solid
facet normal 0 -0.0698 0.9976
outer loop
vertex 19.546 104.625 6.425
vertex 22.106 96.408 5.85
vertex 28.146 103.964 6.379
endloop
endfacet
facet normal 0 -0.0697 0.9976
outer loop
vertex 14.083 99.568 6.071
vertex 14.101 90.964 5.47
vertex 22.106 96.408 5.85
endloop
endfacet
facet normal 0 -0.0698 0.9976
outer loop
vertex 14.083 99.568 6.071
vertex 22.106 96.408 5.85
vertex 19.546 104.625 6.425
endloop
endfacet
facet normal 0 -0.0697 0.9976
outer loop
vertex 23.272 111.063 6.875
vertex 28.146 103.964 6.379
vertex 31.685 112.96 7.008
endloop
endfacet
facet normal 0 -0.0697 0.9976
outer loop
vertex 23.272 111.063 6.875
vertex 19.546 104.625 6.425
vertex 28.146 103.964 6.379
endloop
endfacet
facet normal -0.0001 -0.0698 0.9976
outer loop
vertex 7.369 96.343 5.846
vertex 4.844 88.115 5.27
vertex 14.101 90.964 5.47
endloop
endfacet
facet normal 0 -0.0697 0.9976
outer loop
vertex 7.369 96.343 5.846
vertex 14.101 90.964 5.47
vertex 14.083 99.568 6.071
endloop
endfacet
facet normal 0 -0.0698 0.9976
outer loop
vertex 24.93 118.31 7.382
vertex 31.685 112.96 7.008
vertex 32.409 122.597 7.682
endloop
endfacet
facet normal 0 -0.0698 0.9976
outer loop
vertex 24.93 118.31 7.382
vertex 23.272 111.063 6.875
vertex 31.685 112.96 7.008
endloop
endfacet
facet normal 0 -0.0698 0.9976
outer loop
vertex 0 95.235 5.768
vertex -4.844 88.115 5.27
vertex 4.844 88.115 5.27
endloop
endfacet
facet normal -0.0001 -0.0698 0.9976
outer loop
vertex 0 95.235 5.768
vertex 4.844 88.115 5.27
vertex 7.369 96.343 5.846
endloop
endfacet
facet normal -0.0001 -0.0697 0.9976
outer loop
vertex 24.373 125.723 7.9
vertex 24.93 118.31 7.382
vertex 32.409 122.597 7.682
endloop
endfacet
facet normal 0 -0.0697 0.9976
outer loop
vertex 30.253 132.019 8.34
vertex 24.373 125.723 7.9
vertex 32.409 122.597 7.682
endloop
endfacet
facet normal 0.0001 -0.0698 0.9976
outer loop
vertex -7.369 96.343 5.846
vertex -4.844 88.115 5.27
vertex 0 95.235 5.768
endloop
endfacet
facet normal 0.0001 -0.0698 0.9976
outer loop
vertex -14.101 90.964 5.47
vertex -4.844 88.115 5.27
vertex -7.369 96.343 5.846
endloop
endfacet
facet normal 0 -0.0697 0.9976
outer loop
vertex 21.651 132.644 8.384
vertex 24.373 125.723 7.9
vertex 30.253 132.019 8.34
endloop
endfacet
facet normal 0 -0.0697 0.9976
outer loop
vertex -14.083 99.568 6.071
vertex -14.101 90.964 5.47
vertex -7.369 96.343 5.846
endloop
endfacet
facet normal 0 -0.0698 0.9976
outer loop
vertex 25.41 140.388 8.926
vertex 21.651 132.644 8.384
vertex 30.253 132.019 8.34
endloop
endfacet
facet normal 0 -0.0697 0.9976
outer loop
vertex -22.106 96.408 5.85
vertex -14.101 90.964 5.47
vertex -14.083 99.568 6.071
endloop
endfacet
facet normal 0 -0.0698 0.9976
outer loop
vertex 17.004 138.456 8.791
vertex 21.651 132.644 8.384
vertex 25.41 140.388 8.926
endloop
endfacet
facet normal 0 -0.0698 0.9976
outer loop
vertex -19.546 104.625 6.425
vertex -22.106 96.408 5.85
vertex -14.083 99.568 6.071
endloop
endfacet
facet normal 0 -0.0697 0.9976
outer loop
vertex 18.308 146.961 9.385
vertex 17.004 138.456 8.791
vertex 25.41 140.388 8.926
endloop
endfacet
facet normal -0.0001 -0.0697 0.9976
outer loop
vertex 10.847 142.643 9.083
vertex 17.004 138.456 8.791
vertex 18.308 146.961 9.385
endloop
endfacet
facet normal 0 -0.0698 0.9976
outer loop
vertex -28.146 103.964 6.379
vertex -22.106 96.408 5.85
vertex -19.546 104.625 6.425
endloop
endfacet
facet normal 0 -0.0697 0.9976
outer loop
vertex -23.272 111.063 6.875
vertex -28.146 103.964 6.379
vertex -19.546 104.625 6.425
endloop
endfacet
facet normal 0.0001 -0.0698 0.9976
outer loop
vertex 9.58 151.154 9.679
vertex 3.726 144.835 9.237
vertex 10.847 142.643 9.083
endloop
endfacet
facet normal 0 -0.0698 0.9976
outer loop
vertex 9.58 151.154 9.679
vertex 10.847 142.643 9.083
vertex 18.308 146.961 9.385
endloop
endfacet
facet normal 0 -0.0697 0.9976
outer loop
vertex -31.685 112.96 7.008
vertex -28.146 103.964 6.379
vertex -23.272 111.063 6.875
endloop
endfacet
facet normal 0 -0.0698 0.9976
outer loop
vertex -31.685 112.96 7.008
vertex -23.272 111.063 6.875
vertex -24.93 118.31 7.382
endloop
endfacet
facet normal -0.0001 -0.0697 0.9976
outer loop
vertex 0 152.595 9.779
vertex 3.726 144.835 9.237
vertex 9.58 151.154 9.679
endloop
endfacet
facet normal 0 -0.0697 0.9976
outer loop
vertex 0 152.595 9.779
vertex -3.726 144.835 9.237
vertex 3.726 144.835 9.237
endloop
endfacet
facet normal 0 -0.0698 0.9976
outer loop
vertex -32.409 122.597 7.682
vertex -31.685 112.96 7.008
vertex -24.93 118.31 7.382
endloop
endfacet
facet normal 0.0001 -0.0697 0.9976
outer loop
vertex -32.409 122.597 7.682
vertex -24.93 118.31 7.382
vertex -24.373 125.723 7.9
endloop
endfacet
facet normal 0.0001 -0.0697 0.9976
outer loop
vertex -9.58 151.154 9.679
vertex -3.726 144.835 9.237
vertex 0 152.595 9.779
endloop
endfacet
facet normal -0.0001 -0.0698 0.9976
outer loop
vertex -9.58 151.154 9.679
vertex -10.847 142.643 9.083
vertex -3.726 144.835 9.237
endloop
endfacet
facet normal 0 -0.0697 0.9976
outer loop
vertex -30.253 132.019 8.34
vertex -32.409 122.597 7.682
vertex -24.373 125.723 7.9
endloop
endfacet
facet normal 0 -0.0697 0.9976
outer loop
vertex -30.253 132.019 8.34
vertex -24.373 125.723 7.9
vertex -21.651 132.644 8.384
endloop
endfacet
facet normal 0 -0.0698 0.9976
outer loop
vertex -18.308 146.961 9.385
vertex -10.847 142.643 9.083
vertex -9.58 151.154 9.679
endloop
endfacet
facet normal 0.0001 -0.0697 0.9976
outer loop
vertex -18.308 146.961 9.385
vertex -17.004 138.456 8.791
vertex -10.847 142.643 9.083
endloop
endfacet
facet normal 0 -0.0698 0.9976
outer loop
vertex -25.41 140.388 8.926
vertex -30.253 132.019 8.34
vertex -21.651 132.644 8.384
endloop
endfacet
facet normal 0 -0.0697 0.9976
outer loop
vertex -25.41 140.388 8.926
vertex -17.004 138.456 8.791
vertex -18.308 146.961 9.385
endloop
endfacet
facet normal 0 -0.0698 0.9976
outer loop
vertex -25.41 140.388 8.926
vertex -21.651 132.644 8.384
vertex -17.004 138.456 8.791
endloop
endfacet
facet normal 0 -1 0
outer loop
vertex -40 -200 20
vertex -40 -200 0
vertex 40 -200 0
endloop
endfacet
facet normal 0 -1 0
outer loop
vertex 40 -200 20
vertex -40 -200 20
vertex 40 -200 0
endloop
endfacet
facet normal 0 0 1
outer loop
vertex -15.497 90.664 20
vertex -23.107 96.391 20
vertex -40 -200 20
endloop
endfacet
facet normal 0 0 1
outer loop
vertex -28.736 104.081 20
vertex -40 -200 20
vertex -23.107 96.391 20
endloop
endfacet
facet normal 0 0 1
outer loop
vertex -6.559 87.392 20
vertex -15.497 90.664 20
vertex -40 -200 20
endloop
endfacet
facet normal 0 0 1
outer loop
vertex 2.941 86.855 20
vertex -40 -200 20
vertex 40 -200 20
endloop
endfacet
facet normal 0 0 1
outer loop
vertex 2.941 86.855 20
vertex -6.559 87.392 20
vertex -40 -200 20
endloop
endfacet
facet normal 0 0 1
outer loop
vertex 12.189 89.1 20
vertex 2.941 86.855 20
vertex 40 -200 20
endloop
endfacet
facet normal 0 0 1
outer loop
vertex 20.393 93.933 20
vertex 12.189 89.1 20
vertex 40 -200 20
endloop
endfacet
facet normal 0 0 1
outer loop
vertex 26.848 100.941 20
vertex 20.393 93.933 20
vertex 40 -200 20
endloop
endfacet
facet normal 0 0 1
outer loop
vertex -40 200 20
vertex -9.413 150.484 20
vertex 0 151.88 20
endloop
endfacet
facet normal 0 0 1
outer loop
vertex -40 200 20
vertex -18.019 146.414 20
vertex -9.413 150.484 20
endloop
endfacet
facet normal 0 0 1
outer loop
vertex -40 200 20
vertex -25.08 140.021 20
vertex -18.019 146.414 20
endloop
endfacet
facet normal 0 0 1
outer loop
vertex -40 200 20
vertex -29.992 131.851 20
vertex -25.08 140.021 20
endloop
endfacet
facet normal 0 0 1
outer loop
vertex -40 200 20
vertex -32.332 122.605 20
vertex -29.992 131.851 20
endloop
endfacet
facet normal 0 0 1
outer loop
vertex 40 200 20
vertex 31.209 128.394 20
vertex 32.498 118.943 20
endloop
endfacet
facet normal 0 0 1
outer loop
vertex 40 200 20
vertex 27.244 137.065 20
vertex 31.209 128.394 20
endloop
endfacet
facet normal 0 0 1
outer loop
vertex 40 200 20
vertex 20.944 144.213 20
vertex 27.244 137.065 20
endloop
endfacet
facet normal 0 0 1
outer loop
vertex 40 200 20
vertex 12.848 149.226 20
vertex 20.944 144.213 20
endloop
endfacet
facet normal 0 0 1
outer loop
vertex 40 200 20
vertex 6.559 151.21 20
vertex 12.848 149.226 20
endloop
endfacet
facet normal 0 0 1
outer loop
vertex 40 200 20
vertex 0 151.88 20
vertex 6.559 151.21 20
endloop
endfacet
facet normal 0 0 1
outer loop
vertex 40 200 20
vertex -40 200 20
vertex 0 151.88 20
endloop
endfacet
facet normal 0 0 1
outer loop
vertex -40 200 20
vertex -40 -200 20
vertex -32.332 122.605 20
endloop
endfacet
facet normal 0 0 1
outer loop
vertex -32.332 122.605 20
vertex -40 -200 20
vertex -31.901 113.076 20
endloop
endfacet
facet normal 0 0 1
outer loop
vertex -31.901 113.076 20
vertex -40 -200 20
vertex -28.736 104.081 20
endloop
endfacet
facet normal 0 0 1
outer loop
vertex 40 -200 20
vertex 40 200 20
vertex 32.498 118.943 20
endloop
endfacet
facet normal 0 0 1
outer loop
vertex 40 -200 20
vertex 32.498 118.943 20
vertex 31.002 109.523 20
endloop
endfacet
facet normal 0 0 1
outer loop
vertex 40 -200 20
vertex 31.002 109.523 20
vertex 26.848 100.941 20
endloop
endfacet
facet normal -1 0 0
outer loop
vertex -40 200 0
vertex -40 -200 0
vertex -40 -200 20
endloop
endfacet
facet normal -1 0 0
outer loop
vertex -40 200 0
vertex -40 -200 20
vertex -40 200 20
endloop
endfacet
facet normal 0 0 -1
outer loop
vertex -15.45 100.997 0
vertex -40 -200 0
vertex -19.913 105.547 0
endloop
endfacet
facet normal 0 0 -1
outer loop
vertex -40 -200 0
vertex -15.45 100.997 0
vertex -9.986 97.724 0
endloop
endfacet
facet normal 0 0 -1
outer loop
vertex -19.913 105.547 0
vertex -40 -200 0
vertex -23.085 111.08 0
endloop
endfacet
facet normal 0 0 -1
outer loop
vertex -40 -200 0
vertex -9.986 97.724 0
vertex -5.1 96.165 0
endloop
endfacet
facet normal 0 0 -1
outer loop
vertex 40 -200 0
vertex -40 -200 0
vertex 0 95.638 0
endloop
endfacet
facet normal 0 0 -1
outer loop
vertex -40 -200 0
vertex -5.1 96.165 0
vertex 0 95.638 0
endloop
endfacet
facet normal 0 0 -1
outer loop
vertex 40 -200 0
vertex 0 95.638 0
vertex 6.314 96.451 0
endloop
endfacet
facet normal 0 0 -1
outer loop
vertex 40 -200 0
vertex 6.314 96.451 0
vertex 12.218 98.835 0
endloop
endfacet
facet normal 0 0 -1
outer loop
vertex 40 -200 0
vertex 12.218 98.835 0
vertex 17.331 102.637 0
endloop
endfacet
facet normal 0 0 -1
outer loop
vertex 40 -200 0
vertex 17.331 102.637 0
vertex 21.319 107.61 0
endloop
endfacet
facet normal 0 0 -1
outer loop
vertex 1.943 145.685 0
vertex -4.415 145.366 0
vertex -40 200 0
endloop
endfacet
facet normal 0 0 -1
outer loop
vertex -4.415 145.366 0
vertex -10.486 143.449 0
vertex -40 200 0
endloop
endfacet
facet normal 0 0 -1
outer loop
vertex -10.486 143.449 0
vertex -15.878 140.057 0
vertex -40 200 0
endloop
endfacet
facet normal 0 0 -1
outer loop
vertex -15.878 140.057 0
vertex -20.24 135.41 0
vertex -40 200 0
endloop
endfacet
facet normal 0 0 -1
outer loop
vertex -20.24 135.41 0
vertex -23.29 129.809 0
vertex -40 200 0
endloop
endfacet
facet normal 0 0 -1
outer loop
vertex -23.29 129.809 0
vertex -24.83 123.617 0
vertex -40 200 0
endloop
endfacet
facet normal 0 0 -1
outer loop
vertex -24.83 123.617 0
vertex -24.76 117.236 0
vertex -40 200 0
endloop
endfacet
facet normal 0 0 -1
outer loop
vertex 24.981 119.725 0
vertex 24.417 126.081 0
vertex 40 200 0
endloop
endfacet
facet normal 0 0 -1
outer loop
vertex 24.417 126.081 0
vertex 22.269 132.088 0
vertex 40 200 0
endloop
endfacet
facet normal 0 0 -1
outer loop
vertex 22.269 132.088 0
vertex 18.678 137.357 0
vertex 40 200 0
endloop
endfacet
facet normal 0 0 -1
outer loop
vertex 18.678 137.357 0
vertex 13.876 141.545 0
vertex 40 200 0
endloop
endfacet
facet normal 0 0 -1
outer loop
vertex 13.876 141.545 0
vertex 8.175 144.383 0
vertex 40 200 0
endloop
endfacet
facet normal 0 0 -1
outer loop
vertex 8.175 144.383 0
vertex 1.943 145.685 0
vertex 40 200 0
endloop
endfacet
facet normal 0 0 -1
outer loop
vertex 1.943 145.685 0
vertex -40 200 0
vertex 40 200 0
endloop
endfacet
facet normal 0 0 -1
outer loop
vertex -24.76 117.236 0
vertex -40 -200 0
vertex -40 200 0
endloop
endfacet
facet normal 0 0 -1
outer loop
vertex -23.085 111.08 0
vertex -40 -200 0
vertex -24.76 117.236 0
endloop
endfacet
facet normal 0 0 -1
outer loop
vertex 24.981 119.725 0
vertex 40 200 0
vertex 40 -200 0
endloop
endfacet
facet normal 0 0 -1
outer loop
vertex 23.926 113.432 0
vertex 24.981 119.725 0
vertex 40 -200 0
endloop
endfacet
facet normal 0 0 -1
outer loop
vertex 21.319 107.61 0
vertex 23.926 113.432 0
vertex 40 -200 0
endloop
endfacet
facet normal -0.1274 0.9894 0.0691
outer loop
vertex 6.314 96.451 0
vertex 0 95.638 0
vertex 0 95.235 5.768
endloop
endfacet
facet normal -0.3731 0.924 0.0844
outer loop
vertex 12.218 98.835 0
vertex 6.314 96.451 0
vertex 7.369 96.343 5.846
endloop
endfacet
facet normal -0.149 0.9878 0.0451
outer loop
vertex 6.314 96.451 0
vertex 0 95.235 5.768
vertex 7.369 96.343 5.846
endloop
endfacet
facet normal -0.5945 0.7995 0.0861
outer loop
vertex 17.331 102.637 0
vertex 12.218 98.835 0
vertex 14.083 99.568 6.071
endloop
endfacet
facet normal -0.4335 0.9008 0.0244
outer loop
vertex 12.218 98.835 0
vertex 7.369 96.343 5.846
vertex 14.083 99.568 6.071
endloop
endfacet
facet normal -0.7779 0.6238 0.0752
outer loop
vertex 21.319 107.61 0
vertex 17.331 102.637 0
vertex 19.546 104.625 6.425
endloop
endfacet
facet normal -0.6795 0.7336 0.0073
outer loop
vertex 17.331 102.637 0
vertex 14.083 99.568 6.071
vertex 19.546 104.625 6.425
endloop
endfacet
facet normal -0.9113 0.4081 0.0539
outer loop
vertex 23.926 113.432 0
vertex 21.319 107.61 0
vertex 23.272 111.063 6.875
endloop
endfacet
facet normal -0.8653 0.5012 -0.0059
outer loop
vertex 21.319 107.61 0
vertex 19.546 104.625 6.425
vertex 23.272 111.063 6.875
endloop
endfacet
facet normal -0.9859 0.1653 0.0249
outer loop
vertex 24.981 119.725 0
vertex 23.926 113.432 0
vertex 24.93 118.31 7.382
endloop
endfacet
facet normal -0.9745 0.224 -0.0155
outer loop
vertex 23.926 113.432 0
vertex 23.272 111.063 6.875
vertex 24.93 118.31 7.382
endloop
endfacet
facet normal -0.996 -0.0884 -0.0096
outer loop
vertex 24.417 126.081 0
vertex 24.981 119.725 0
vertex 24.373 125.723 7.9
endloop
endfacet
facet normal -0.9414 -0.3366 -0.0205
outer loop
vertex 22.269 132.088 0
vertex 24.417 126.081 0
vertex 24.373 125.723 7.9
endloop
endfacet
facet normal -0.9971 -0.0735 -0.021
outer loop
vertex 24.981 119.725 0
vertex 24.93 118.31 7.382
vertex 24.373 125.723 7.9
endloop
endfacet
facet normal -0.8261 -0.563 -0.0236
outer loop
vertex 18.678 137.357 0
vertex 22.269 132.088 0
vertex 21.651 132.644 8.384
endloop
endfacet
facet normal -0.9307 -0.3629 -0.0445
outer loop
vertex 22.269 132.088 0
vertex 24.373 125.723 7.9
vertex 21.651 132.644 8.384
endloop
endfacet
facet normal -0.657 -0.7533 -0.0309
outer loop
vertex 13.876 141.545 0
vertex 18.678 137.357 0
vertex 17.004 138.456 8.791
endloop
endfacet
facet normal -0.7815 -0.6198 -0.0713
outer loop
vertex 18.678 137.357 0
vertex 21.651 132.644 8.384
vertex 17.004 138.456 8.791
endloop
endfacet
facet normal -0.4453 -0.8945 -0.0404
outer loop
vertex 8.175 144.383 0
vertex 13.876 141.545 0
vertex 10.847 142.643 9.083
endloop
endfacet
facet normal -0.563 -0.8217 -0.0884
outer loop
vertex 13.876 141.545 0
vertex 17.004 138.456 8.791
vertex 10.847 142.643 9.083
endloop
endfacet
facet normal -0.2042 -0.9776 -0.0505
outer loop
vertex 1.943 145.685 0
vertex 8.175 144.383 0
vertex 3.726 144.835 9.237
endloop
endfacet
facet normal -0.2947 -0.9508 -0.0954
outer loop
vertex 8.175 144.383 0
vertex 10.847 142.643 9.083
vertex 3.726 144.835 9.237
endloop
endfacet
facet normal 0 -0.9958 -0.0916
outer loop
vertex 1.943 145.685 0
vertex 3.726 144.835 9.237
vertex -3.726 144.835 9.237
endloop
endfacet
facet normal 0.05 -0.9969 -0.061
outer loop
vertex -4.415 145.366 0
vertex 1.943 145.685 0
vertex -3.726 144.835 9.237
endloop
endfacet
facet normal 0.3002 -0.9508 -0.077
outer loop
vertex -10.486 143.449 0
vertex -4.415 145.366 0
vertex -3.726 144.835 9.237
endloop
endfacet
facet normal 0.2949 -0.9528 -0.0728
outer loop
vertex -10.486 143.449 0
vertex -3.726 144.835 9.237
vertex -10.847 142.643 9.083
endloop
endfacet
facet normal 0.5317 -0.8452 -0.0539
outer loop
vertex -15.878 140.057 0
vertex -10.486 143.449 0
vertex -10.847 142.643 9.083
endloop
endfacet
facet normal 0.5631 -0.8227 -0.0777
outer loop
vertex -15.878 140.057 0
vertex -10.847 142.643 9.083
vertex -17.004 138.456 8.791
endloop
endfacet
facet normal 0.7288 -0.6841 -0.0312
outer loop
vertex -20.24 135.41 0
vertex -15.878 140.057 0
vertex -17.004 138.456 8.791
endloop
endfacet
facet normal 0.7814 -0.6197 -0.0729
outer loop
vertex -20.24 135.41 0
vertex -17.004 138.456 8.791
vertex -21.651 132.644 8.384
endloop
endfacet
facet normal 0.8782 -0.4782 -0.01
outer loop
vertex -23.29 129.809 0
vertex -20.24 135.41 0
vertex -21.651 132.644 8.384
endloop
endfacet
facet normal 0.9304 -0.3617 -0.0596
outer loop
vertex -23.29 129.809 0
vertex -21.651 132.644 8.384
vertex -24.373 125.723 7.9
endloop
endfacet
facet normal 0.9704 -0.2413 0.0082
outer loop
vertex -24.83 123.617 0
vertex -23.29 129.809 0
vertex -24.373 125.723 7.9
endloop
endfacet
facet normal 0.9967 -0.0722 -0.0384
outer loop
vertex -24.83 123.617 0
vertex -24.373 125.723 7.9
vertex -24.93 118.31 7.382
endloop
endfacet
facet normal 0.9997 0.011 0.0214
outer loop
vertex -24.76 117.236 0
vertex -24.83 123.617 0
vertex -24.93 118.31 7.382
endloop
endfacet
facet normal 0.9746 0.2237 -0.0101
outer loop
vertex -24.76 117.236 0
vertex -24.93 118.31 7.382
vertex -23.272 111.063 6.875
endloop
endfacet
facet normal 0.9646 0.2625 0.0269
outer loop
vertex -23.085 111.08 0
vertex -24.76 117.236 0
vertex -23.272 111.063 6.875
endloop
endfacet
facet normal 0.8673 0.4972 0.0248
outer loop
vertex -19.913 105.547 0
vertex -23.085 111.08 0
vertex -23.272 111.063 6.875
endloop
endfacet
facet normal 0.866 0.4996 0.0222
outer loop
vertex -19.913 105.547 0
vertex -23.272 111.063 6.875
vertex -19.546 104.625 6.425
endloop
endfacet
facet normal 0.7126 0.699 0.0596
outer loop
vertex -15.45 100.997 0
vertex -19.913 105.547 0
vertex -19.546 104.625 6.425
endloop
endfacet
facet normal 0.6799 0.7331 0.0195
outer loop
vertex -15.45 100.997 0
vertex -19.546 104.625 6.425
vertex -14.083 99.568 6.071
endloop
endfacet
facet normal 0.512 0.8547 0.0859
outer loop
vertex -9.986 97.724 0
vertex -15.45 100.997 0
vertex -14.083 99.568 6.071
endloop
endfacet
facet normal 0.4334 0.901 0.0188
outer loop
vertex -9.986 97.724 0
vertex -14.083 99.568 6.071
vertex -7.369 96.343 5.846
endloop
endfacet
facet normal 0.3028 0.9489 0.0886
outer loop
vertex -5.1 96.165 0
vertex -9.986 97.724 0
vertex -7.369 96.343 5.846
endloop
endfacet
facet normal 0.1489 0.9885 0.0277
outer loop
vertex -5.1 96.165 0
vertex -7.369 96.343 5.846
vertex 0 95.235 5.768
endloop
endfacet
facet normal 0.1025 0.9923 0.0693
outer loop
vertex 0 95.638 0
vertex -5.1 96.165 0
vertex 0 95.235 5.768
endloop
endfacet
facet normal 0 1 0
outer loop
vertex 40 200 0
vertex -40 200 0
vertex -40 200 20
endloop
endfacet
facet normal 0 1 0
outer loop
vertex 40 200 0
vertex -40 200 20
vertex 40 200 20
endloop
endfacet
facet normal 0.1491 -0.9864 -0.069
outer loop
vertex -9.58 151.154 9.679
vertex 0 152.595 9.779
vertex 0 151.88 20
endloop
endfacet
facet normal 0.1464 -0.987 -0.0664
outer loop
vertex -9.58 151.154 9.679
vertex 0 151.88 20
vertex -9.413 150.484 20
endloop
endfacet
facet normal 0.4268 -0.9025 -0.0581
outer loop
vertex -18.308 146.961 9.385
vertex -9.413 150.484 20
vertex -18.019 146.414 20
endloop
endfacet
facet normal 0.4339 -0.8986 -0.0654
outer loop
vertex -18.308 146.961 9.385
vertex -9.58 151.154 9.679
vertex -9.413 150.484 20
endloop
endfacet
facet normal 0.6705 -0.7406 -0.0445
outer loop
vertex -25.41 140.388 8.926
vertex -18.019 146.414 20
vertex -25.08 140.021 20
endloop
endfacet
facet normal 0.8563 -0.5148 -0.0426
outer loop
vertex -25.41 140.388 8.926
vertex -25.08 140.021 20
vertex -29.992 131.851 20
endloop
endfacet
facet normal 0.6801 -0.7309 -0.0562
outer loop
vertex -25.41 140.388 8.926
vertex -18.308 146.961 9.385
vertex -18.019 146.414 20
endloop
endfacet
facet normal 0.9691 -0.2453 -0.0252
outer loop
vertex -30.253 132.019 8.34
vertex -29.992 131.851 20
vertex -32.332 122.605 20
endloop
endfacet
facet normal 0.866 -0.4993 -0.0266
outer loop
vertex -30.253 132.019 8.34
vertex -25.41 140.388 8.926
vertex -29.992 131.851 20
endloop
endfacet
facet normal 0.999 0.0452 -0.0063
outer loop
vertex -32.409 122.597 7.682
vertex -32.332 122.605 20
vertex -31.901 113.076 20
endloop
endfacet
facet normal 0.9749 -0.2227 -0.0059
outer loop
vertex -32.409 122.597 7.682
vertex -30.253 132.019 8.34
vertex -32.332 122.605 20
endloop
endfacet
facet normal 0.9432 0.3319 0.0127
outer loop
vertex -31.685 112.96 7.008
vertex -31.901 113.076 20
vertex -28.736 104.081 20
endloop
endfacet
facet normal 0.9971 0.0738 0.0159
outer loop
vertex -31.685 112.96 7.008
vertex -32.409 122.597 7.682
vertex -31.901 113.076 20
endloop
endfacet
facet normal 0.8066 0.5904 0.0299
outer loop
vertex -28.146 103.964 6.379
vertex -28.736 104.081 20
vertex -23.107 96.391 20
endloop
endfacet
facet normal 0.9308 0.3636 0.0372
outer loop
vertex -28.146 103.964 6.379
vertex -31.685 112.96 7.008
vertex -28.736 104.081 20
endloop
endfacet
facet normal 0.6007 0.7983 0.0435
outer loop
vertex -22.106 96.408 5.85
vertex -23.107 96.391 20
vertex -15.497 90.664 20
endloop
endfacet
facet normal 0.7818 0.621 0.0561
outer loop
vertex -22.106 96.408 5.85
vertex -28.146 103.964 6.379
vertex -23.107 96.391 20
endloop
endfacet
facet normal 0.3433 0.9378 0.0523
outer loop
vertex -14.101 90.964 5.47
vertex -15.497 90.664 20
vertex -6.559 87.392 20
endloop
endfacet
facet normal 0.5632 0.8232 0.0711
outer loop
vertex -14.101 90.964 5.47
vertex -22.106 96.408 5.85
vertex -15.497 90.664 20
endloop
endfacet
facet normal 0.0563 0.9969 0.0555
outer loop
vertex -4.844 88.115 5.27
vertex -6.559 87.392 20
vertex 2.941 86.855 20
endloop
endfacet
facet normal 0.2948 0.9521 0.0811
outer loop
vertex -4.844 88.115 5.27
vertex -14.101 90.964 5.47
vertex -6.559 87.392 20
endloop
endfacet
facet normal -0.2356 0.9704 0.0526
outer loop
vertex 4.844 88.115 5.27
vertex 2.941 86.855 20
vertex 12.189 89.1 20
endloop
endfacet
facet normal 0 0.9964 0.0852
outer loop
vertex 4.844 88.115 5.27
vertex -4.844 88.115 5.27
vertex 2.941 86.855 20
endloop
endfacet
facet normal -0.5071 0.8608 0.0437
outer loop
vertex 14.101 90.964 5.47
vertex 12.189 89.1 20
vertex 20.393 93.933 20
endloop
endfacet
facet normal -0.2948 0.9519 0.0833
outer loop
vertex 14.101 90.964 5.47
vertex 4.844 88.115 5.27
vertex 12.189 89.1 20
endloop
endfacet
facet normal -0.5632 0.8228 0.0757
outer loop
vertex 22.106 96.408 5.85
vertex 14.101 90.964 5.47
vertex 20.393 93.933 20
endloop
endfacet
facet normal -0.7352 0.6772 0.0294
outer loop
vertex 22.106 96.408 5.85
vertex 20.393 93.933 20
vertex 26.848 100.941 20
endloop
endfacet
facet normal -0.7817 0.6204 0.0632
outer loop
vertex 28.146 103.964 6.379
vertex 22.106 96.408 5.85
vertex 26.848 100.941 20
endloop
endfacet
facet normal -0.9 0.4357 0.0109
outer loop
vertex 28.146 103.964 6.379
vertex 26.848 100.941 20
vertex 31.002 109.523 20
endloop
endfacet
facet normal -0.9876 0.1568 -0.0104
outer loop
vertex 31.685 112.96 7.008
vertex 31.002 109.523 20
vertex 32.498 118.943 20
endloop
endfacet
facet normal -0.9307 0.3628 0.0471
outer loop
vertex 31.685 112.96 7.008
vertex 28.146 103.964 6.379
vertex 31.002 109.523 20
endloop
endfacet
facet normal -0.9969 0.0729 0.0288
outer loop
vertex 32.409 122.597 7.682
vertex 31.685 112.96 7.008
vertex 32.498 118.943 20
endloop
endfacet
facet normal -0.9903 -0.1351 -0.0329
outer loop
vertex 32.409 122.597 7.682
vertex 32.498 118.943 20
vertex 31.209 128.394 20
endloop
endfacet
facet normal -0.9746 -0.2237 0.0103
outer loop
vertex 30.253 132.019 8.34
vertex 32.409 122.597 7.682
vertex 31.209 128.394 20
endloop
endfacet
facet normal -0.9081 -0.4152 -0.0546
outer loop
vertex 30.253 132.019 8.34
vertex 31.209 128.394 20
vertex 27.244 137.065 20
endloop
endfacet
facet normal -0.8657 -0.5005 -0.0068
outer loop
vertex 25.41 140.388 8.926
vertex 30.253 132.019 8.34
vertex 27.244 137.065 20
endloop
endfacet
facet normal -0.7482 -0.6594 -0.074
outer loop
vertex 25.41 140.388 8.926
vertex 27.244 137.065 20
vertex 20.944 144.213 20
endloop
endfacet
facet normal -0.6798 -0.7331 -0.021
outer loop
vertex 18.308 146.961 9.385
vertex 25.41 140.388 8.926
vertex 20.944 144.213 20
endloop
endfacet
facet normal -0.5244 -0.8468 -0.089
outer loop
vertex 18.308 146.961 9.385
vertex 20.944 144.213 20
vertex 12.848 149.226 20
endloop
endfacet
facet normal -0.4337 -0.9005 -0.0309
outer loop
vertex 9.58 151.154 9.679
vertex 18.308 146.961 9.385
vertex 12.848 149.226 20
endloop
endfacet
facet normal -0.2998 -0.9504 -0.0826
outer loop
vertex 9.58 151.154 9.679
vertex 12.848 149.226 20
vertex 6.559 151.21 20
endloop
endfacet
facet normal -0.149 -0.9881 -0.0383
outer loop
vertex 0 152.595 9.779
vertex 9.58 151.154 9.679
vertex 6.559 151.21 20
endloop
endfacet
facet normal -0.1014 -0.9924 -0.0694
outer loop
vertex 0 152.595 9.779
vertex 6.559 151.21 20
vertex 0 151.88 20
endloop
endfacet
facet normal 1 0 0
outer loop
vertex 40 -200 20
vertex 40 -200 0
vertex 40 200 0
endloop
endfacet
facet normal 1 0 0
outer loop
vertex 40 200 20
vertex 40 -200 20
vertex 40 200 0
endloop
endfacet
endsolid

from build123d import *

# Parameters (mm, degrees)
SKETCH1_W           = 80
SKETCH1_H           = 400
BOSS_EXTRUDE1_DEPTH = 20
SKETCH4_R           = 32.5
CUT_EXTRUDE4_DEPTH  = 206.087962432
SKETCH6_R           = 25
CUT_EXTRUDE6_DEPTH  = 206.087962432


with BuildPart() as part:
    # Sketch1 → Boss-Extrude1 (new body)
    with BuildSketch(Plane.XY):
        Rectangle(SKETCH1_W, SKETCH1_H)
    extrude(amount=BOSS_EXTRUDE1_DEPTH)

    # Sketch4 → Cut-Extrude4 (cut, through all)
    with BuildSketch(Plane(origin=(0, 0.062016747, -0.8868808), x_dir=(1, 0, 0), z_dir=(0, -0.06975647374412192, 0.9975640502598245))):
        with Locations(Location((0, 120.405250769, 0), (0, 0, 90))):
            Circle(SKETCH4_R)
    extrude(amount=CUT_EXTRUDE4_DEPTH, mode=Mode.SUBTRACT)

    # Sketch6 → Cut-Extrude6 (cut, through all)
    with BuildSketch(Plane(origin=(0, 0.062016747, -0.8868808), x_dir=(1, 0, 0), z_dir=(0, -0.06975647374412192, 0.9975640502598246))):
        with Locations(Location((0, 120.405250769, 0), (0, 0, 270))):
            Circle(SKETCH6_R)
    extrude(amount=-CUT_EXTRUDE6_DEPTH, mode=Mode.SUBTRACT)


solid = part.part
